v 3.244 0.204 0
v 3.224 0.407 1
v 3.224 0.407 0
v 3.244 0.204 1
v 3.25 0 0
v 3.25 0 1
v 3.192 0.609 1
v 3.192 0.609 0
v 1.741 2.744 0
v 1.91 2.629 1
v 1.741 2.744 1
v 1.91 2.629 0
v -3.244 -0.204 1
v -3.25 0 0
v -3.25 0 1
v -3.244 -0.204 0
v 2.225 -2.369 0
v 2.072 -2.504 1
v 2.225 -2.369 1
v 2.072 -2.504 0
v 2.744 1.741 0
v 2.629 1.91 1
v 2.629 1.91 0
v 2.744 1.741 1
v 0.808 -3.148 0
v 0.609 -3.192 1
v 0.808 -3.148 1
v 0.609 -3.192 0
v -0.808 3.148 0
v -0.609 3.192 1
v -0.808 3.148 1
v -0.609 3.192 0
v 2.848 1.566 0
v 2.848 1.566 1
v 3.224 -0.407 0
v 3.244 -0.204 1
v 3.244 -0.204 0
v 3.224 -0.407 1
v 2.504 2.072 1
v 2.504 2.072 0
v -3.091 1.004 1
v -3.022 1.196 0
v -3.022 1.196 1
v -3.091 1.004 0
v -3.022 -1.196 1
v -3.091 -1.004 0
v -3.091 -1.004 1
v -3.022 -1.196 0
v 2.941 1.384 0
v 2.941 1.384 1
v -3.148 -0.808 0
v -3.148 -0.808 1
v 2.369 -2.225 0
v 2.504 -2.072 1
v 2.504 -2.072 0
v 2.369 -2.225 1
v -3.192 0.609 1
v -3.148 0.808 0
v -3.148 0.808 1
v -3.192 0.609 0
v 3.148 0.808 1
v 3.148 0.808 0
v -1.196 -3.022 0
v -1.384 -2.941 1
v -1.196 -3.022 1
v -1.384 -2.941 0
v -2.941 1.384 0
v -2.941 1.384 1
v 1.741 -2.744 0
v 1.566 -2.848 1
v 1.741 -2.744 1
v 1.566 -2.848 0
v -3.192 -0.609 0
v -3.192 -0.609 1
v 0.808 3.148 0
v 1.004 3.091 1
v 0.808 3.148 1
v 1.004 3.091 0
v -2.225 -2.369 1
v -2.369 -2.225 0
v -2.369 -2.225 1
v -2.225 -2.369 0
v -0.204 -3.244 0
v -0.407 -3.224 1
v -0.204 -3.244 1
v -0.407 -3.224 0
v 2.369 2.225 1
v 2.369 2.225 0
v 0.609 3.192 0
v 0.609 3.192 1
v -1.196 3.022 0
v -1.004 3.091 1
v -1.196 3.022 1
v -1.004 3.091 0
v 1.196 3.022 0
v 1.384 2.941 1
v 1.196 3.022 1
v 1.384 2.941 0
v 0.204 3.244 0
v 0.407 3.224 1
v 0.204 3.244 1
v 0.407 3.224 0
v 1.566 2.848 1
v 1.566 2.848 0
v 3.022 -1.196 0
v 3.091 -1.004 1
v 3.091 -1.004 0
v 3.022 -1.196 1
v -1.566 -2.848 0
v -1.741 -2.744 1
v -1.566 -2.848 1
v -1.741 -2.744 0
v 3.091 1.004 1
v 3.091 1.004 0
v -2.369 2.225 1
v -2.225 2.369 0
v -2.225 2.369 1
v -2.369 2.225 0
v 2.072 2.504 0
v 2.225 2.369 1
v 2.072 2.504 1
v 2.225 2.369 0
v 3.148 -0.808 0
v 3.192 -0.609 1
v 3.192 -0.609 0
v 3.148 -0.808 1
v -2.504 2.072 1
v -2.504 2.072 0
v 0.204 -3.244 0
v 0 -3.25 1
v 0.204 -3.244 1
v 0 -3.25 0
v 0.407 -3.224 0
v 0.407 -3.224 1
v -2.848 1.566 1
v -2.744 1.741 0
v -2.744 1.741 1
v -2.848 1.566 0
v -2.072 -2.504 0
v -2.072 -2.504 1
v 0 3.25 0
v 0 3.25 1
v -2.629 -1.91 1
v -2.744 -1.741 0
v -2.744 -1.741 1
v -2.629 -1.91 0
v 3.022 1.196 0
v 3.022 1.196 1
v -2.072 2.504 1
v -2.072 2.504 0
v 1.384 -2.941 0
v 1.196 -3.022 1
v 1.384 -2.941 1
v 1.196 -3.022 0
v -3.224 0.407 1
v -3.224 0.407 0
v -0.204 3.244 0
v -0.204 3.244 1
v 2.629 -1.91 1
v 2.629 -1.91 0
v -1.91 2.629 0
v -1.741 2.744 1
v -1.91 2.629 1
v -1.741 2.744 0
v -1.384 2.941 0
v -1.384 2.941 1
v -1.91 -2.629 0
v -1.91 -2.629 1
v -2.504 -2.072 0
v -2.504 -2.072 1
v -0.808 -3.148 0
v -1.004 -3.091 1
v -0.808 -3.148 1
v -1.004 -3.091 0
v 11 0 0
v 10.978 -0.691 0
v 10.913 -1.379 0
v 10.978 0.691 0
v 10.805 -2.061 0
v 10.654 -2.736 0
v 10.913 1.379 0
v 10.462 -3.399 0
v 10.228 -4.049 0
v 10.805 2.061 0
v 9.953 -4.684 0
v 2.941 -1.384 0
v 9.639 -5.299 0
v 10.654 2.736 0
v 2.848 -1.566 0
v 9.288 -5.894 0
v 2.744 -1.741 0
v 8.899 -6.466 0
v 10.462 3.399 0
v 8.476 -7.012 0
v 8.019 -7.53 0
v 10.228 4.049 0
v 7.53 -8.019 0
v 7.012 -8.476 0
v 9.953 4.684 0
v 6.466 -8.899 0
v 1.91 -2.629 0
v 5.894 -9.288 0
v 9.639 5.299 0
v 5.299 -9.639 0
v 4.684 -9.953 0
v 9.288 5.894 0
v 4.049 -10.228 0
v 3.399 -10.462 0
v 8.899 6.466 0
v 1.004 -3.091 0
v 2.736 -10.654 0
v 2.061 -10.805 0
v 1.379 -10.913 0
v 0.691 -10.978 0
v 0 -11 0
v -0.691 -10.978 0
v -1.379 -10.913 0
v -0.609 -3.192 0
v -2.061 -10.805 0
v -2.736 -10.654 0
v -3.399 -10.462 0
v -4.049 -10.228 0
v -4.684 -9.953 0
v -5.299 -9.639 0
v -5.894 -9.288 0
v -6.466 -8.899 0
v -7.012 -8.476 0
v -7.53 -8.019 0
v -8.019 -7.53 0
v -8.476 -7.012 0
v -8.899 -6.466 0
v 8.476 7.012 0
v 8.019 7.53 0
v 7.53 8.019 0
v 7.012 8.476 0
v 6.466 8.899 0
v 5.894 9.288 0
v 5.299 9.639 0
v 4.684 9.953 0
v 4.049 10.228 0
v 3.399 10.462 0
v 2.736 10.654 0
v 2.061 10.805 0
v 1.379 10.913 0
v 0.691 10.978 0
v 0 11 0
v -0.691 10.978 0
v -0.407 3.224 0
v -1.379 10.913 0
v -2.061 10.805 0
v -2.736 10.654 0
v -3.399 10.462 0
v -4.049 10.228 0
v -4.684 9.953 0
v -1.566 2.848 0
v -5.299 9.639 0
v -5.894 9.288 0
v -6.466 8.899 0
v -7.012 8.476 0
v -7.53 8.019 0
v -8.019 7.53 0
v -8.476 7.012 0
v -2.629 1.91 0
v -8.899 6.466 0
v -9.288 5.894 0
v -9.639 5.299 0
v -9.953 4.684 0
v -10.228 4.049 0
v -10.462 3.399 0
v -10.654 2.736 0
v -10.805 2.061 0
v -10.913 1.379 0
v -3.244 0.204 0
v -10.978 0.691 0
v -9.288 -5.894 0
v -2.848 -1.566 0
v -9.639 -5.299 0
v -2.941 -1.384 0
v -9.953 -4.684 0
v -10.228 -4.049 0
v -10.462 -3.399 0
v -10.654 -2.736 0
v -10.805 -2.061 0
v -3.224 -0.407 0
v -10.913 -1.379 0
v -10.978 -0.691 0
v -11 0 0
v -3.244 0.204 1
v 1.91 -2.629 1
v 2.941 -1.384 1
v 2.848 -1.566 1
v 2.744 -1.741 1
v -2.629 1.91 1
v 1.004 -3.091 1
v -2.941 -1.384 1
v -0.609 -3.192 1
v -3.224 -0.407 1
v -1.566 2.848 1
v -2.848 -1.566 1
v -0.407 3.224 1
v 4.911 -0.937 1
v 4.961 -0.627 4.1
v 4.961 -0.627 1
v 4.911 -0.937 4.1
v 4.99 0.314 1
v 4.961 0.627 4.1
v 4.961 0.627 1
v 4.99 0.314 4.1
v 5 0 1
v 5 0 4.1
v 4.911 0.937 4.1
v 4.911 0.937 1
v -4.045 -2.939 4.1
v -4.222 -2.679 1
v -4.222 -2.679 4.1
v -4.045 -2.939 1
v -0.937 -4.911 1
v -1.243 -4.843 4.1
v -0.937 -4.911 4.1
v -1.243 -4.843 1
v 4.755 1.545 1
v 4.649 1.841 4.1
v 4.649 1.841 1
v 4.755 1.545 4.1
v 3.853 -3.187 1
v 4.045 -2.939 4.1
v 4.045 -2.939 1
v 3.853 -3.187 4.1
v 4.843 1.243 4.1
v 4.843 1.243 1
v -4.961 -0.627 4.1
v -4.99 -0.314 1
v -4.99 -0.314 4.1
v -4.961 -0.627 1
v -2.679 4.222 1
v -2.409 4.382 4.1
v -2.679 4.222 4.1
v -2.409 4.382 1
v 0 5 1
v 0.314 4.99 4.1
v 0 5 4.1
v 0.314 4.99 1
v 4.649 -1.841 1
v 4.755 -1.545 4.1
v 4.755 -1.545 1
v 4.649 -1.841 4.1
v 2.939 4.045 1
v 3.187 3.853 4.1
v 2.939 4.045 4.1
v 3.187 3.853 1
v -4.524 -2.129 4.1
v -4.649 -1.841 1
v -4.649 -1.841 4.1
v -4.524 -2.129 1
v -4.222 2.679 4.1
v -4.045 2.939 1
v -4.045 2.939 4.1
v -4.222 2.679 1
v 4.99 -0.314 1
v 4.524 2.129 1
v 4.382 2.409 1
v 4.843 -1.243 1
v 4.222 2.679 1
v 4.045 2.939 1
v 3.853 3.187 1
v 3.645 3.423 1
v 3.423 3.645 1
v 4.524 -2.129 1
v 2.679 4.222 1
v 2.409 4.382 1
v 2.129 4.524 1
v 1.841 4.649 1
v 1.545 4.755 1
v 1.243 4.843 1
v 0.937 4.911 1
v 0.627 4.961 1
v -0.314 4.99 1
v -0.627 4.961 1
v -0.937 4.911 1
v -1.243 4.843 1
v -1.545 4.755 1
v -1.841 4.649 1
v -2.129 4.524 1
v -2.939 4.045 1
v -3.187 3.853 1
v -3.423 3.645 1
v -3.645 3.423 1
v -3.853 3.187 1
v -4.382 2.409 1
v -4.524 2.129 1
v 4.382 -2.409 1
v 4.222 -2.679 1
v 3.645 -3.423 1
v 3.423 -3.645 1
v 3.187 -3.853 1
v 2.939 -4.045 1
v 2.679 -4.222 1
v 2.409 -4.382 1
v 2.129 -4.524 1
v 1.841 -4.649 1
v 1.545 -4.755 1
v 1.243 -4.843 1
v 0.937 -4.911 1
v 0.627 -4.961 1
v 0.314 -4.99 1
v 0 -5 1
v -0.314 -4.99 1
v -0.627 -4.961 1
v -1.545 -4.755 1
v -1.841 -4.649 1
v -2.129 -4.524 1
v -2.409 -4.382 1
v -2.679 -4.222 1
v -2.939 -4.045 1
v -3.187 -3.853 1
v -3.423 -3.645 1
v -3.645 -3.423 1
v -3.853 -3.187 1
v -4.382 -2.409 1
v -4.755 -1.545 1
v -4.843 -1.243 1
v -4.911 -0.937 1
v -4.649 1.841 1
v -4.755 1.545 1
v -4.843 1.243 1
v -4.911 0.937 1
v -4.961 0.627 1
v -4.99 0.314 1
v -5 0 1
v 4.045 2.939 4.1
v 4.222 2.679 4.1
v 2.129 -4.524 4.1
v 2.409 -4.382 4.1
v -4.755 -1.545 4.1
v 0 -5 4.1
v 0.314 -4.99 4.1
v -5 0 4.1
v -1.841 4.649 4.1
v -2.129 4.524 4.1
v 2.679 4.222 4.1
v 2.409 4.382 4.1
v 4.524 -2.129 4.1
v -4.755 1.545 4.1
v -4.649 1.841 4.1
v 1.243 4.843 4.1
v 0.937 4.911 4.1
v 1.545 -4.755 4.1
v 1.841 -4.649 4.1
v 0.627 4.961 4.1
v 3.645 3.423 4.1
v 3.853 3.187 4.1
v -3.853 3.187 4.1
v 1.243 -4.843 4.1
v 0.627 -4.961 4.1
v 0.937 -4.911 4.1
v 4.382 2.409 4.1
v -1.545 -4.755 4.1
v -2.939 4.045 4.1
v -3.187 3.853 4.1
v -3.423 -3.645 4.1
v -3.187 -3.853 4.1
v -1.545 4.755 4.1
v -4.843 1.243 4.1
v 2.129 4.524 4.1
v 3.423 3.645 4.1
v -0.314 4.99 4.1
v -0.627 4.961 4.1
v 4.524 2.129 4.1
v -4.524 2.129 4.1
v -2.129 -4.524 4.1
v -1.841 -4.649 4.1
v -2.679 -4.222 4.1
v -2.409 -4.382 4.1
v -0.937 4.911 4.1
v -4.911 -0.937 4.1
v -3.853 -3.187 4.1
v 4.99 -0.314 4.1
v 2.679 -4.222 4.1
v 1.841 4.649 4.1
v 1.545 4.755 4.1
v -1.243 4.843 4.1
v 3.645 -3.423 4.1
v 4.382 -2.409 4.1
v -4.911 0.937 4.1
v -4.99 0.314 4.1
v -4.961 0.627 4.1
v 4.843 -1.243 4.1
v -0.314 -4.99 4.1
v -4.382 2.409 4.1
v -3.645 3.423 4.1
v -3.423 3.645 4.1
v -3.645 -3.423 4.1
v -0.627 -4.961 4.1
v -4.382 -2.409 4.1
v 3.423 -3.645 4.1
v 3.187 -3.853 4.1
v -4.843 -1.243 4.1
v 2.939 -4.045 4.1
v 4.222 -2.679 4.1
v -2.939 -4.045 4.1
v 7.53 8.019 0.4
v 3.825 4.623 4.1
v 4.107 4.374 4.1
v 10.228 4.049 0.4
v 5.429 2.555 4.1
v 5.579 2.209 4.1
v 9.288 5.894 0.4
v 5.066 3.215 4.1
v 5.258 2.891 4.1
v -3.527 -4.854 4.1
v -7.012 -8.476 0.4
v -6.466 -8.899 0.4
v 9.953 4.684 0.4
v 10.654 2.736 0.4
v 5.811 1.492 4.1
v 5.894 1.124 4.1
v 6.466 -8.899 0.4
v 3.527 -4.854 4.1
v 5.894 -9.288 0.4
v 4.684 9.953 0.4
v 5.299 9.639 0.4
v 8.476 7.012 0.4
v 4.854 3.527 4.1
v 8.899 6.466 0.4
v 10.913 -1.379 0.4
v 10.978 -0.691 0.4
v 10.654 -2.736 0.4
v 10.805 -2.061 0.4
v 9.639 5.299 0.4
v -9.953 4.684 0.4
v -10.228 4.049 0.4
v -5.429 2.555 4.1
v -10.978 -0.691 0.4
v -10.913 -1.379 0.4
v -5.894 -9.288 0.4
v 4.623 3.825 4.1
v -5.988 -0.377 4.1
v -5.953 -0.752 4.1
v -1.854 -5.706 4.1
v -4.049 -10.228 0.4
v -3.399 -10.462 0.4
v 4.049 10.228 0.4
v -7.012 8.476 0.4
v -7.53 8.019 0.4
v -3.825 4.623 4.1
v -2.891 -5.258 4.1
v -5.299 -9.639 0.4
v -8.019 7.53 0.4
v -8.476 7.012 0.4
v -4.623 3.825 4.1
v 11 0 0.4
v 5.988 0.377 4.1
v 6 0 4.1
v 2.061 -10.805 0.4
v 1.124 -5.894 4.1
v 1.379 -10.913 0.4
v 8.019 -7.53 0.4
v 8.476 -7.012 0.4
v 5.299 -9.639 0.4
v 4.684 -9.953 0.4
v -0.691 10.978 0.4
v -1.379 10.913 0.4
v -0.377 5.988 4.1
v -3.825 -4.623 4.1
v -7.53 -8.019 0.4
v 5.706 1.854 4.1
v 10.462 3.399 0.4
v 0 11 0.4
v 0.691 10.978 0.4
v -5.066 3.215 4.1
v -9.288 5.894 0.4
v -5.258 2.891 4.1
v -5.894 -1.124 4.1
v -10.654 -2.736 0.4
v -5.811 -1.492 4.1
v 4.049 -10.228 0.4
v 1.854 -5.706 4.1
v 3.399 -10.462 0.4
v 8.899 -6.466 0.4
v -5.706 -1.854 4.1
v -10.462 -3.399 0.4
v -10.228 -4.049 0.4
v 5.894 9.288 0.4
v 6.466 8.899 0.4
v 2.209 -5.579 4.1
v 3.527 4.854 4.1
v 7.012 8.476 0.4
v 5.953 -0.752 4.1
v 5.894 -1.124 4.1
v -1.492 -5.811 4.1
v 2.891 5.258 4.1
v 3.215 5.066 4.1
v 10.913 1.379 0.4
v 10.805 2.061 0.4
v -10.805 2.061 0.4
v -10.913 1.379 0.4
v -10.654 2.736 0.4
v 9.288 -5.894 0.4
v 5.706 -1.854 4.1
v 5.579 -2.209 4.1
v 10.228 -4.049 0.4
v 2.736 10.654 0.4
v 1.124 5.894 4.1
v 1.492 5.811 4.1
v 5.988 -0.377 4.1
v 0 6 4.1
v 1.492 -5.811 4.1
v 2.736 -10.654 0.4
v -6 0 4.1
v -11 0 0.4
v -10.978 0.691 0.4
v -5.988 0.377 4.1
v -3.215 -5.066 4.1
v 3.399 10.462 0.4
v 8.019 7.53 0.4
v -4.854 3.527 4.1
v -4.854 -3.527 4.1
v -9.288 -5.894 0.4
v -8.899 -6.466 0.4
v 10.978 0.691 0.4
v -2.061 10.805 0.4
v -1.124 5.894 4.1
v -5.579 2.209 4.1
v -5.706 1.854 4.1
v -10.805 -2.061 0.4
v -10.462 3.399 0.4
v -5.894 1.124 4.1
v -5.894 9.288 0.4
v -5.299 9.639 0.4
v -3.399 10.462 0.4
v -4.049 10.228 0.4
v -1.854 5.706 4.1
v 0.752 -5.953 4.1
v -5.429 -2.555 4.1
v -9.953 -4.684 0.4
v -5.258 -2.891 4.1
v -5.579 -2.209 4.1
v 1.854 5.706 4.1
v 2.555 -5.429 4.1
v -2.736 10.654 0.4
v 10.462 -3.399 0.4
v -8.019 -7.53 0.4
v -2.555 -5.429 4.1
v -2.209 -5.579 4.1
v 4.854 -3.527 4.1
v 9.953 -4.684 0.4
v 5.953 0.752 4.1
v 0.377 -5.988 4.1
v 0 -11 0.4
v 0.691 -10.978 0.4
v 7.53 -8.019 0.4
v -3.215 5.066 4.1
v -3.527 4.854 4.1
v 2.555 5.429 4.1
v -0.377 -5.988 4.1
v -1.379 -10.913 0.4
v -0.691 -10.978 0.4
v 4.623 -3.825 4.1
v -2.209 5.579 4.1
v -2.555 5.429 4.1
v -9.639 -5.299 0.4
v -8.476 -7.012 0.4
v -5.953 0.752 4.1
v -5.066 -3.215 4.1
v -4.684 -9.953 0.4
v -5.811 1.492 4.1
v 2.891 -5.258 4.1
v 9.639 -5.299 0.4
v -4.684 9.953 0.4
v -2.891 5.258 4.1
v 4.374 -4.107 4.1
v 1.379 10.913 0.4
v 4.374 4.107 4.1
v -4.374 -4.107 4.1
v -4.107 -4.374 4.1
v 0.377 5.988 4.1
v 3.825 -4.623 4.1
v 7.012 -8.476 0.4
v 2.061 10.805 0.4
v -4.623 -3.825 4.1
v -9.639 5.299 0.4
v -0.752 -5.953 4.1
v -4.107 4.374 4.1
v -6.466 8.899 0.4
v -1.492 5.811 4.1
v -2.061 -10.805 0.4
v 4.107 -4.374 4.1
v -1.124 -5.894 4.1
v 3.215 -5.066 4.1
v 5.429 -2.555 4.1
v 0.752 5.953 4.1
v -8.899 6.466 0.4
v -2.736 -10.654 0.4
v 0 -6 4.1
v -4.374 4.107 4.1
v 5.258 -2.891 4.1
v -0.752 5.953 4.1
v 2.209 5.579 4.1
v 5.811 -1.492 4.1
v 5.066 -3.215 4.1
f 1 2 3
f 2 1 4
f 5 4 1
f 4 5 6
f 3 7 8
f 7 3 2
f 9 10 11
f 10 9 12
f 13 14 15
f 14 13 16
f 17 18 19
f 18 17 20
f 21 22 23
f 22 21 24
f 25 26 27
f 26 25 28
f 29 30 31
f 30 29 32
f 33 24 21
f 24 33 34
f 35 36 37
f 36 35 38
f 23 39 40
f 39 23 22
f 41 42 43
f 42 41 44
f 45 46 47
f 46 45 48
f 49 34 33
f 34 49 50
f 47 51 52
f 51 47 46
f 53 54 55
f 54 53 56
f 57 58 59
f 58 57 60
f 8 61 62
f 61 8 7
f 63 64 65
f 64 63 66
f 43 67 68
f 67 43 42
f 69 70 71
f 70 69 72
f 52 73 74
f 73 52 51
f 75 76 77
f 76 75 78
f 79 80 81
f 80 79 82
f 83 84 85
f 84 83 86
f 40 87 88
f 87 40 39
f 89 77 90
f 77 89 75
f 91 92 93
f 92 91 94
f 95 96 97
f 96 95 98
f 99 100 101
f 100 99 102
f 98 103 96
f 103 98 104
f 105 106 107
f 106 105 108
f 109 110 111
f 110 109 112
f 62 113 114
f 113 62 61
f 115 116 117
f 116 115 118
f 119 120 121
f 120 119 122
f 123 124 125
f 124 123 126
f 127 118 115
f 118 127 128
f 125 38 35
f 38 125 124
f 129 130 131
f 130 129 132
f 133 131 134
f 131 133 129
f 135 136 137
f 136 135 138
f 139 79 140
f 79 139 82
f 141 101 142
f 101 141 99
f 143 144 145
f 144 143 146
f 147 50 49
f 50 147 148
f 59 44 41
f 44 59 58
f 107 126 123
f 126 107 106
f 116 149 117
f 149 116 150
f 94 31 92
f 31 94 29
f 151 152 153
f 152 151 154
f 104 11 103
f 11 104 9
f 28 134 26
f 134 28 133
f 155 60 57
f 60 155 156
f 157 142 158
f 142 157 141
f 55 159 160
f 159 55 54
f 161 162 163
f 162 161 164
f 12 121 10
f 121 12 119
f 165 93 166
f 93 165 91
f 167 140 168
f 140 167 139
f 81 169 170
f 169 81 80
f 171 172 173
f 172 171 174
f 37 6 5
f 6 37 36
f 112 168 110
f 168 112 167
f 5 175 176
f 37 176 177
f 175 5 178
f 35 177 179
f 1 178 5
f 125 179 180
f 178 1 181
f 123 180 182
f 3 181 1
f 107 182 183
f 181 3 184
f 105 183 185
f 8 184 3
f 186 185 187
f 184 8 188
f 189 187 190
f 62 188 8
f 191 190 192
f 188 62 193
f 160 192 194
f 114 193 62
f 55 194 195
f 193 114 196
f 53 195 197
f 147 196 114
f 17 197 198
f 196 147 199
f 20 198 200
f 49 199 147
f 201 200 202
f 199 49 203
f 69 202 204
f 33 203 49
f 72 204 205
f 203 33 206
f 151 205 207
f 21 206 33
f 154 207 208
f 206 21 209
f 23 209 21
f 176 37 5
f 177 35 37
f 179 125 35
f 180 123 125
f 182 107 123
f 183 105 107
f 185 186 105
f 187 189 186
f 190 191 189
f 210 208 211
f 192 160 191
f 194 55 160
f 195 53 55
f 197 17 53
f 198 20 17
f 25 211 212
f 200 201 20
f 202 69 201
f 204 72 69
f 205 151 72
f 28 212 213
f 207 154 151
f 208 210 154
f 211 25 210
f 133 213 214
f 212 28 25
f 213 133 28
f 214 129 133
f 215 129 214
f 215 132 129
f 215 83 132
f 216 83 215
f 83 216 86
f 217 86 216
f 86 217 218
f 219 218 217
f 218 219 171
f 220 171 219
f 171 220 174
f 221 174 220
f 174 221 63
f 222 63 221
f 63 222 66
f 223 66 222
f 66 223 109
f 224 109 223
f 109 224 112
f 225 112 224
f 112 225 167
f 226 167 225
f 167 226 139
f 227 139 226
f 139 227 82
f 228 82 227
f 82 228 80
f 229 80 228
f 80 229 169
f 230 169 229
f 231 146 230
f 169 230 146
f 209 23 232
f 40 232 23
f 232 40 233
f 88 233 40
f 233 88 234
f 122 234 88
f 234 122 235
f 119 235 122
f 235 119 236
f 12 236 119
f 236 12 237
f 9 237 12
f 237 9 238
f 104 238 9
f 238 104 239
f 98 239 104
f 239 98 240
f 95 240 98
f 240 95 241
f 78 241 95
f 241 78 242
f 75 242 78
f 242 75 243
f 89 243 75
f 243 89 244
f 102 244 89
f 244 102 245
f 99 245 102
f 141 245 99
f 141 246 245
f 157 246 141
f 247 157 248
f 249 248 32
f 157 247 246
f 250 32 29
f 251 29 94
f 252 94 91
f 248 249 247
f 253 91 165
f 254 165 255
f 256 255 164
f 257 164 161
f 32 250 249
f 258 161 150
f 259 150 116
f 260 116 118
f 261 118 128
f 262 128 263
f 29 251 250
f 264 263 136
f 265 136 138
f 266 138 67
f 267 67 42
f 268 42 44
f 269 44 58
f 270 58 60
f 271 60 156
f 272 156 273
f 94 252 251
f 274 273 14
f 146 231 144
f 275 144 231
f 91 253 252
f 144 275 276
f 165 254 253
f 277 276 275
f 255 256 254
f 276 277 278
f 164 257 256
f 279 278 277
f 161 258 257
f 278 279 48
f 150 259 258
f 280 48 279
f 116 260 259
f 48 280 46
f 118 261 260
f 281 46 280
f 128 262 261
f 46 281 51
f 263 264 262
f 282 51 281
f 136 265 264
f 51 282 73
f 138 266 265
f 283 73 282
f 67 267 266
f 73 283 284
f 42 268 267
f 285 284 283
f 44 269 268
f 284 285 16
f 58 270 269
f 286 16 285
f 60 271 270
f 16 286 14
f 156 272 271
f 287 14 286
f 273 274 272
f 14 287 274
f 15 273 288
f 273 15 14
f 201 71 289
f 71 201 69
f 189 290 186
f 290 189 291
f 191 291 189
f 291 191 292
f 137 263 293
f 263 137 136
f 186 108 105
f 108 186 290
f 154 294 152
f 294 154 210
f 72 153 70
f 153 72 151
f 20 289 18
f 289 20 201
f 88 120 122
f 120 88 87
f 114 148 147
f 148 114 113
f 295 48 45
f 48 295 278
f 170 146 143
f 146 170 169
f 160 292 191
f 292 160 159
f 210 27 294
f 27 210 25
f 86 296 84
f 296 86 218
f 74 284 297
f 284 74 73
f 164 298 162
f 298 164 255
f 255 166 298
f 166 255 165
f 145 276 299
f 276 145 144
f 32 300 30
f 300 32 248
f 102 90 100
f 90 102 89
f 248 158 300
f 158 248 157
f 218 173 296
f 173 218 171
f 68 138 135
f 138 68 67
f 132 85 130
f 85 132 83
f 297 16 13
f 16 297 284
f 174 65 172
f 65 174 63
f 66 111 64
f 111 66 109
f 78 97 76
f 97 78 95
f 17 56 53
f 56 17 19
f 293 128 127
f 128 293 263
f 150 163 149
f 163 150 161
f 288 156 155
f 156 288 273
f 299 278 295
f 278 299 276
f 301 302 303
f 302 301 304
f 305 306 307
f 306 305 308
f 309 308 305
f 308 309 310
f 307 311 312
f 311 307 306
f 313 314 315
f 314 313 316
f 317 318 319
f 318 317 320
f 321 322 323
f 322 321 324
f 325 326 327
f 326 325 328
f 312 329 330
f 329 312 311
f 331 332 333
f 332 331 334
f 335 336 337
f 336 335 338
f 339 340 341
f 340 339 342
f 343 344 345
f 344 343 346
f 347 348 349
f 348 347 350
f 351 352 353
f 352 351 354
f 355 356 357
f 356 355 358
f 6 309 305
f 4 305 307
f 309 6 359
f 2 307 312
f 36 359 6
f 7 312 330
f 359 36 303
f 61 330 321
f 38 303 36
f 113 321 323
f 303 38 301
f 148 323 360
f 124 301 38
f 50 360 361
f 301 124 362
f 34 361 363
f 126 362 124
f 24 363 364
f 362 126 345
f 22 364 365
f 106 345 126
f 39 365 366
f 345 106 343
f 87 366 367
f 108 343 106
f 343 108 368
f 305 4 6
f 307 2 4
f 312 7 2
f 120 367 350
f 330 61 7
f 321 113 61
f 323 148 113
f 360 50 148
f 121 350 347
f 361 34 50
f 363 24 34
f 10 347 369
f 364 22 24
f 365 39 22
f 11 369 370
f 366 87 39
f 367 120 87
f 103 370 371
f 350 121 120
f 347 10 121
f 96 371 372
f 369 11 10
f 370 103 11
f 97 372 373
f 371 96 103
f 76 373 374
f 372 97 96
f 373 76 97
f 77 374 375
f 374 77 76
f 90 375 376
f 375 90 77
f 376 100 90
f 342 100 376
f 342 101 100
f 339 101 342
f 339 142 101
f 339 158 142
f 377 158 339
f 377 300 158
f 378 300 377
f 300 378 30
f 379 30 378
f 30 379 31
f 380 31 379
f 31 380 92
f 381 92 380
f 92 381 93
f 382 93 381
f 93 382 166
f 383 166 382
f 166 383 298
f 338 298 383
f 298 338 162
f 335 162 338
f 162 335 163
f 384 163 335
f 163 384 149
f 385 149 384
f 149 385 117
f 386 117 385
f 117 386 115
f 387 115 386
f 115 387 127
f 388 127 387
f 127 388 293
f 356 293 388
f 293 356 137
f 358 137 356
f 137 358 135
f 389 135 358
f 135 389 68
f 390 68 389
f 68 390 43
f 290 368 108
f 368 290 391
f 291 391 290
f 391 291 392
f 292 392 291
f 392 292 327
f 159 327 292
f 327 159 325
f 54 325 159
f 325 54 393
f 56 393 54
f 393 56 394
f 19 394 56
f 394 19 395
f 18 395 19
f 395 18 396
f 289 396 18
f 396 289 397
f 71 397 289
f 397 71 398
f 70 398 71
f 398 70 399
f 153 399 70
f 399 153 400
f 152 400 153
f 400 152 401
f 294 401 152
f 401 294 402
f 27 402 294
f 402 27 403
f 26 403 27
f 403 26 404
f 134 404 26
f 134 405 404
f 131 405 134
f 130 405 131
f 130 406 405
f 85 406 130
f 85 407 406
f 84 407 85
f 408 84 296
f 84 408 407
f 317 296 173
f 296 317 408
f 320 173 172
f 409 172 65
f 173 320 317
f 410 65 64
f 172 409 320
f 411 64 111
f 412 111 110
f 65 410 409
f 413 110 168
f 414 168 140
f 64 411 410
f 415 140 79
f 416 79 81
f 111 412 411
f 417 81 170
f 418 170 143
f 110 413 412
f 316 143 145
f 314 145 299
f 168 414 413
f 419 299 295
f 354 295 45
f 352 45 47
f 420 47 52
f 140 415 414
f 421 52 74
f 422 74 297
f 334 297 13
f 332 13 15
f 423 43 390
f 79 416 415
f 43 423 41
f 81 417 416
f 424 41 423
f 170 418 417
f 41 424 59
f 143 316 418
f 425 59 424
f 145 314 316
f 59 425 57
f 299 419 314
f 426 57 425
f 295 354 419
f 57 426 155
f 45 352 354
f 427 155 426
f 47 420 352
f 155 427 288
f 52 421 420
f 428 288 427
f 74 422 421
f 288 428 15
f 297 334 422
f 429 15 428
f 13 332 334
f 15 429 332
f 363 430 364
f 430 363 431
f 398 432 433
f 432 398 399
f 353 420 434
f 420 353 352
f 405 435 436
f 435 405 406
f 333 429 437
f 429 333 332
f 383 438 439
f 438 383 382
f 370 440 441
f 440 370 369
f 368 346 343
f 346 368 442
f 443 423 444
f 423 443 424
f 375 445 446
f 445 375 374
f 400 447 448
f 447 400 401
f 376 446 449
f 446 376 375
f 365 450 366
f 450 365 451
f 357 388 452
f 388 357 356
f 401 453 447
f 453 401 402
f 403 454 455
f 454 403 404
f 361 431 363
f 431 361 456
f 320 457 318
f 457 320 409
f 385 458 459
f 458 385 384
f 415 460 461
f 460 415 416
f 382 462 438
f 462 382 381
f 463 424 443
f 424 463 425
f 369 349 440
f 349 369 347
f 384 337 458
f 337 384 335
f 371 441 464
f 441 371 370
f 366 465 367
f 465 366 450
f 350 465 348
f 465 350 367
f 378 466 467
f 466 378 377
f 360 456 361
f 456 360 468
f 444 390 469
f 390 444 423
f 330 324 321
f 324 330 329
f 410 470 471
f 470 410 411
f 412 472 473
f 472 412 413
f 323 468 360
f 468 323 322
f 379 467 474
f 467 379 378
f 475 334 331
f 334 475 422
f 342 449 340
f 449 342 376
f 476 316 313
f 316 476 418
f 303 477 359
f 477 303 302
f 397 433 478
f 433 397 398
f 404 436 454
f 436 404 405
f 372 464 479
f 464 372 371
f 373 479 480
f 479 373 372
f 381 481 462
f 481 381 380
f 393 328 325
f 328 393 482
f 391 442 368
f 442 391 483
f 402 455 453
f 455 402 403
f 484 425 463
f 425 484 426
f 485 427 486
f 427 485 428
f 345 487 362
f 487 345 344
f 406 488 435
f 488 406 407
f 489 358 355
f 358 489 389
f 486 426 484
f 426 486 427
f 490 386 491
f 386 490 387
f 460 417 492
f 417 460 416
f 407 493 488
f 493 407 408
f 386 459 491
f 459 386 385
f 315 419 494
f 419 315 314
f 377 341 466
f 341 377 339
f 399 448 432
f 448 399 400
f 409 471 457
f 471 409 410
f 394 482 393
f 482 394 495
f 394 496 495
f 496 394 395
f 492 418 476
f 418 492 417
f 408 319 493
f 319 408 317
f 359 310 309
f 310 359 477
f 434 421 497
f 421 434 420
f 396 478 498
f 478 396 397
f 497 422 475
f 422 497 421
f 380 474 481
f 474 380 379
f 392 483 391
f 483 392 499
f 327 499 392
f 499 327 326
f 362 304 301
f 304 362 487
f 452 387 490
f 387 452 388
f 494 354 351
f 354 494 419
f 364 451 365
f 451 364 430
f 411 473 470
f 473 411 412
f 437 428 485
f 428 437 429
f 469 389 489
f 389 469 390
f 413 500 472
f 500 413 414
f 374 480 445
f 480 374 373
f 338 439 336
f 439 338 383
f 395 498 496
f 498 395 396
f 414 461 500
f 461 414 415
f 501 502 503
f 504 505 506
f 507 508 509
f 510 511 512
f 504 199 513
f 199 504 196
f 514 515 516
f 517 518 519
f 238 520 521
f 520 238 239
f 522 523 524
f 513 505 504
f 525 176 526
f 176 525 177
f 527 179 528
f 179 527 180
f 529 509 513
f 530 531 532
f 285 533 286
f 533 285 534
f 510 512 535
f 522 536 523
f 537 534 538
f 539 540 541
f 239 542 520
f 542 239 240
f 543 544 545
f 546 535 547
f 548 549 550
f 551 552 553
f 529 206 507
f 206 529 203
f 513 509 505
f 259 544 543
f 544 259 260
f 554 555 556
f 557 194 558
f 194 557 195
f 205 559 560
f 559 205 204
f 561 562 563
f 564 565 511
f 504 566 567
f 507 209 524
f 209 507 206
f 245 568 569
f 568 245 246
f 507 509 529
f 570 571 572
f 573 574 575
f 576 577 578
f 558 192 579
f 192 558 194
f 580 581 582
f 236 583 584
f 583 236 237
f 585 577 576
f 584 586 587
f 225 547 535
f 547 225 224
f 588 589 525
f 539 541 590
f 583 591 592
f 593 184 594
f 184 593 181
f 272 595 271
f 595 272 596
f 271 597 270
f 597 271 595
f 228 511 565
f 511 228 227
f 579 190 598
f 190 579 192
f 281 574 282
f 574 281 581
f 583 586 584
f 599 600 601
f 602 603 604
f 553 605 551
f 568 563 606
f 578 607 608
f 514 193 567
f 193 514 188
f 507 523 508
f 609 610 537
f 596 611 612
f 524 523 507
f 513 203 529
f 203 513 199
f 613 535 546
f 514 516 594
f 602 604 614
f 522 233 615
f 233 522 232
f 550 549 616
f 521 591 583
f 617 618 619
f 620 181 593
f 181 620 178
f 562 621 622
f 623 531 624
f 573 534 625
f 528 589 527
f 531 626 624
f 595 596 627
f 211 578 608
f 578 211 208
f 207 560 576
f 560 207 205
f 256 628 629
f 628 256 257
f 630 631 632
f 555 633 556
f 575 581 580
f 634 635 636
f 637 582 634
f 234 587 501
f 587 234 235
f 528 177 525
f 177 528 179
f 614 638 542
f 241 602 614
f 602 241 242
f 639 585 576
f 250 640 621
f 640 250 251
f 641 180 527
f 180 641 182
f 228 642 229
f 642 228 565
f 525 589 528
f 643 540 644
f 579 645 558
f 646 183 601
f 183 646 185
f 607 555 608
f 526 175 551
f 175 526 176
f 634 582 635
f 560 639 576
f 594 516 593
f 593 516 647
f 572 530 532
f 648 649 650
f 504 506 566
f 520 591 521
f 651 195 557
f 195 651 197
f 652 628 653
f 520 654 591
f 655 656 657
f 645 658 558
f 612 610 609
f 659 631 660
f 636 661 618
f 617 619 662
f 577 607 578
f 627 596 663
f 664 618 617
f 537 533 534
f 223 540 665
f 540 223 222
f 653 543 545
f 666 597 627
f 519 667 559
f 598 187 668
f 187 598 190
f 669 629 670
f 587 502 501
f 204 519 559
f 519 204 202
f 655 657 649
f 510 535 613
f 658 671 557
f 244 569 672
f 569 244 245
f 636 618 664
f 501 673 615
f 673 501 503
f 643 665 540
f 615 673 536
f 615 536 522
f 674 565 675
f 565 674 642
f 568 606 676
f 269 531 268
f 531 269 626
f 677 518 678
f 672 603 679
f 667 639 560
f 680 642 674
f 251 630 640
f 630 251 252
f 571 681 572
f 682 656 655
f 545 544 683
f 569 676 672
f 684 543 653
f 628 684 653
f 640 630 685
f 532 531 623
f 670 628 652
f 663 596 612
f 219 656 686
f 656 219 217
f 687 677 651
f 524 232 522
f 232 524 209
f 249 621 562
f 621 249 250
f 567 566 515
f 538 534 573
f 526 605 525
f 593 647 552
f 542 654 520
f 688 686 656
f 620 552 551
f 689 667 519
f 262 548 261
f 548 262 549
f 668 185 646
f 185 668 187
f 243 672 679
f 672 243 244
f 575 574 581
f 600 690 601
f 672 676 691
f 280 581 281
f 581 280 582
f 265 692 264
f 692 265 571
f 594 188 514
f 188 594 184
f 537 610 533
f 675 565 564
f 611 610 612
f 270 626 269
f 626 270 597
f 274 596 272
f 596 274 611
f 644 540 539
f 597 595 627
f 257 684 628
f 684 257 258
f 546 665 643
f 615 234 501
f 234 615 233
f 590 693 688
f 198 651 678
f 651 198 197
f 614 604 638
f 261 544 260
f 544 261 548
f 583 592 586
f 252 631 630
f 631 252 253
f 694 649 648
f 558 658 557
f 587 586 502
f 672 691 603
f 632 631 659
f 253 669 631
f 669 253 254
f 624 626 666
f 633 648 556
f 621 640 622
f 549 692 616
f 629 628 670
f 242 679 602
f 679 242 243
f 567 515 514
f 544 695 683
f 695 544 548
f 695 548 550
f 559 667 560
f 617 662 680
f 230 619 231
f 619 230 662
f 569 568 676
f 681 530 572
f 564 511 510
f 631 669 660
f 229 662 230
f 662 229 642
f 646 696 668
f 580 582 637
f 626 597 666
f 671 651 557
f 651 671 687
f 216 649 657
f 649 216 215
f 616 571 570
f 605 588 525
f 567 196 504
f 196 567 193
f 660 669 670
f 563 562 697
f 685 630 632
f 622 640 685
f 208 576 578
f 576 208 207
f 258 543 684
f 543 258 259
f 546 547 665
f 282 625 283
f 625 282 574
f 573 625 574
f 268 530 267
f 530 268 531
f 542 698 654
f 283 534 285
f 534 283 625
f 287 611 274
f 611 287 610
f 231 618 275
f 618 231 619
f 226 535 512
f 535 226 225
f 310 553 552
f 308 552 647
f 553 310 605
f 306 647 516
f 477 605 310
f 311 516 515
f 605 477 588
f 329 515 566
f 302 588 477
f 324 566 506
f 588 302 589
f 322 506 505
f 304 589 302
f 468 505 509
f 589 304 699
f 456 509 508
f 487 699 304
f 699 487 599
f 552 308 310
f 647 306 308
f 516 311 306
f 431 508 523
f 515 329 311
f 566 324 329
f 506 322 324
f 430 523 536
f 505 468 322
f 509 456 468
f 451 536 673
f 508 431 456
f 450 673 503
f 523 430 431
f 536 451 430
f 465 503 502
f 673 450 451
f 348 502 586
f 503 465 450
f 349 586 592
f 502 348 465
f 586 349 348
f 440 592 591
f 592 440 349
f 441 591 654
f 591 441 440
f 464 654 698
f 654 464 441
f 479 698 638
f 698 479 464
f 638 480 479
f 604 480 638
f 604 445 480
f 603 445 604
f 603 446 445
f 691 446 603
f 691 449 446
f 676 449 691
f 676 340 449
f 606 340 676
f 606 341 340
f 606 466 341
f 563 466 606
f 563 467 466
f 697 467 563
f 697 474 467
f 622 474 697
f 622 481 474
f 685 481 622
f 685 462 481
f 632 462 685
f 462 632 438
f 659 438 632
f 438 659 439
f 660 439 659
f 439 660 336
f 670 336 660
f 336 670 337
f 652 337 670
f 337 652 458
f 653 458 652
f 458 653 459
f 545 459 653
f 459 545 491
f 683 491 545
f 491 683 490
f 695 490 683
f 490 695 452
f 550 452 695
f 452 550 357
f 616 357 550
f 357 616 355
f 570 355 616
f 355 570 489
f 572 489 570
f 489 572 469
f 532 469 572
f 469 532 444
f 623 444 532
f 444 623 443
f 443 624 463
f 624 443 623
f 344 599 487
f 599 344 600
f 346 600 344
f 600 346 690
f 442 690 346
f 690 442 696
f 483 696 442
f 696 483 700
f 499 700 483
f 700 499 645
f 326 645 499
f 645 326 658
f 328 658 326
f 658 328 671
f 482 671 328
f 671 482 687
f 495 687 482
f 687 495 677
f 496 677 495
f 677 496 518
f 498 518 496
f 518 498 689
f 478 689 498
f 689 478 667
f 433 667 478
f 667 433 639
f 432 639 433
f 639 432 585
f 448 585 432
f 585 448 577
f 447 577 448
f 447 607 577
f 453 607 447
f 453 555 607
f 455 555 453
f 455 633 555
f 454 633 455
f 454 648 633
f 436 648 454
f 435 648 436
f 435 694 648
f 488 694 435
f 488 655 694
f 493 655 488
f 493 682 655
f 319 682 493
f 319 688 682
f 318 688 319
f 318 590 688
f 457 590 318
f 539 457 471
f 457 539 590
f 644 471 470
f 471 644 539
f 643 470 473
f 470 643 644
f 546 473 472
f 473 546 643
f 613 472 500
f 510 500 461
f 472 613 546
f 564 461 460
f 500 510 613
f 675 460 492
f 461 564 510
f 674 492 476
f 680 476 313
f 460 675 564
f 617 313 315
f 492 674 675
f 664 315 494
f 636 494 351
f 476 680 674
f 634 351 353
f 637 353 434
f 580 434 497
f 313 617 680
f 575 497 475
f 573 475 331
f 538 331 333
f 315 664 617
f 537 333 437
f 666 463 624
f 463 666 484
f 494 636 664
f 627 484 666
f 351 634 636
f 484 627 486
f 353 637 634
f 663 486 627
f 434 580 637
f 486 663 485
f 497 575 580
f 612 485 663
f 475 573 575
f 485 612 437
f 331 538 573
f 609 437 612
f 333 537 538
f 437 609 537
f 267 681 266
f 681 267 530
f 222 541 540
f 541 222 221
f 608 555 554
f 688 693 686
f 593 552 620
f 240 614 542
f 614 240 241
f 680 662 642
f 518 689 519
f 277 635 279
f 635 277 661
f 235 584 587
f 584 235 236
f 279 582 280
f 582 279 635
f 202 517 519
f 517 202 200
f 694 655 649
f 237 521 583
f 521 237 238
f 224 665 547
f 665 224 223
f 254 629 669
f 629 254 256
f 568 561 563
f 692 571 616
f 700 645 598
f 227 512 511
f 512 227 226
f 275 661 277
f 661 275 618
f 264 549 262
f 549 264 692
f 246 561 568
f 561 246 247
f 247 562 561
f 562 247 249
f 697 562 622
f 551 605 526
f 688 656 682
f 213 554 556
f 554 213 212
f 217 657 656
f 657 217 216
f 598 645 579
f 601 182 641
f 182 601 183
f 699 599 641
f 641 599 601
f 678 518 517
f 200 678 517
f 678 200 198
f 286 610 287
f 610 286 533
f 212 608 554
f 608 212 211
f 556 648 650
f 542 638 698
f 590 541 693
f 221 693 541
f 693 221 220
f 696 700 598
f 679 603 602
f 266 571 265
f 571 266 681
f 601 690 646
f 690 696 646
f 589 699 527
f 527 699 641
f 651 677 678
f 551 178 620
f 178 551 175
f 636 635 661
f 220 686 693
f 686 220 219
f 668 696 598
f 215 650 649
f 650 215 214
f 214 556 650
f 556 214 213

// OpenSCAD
$fn = 100;

//difference(){
//cylinder(d=30,h=0.8);
//cylinder(d=16,h=0.8);
//}

//19-16

//10

//6.5



difference() {

    hull(){

    cylinder(d=22,h=0.4);
    translate([0,0,4]) cylinder(d=12,h=0.1);
    }

    union(){
        cylinder(d=6.5,h=4);
        translate([0,0,1]) cylinder(d=10,h=4);
    }
}
